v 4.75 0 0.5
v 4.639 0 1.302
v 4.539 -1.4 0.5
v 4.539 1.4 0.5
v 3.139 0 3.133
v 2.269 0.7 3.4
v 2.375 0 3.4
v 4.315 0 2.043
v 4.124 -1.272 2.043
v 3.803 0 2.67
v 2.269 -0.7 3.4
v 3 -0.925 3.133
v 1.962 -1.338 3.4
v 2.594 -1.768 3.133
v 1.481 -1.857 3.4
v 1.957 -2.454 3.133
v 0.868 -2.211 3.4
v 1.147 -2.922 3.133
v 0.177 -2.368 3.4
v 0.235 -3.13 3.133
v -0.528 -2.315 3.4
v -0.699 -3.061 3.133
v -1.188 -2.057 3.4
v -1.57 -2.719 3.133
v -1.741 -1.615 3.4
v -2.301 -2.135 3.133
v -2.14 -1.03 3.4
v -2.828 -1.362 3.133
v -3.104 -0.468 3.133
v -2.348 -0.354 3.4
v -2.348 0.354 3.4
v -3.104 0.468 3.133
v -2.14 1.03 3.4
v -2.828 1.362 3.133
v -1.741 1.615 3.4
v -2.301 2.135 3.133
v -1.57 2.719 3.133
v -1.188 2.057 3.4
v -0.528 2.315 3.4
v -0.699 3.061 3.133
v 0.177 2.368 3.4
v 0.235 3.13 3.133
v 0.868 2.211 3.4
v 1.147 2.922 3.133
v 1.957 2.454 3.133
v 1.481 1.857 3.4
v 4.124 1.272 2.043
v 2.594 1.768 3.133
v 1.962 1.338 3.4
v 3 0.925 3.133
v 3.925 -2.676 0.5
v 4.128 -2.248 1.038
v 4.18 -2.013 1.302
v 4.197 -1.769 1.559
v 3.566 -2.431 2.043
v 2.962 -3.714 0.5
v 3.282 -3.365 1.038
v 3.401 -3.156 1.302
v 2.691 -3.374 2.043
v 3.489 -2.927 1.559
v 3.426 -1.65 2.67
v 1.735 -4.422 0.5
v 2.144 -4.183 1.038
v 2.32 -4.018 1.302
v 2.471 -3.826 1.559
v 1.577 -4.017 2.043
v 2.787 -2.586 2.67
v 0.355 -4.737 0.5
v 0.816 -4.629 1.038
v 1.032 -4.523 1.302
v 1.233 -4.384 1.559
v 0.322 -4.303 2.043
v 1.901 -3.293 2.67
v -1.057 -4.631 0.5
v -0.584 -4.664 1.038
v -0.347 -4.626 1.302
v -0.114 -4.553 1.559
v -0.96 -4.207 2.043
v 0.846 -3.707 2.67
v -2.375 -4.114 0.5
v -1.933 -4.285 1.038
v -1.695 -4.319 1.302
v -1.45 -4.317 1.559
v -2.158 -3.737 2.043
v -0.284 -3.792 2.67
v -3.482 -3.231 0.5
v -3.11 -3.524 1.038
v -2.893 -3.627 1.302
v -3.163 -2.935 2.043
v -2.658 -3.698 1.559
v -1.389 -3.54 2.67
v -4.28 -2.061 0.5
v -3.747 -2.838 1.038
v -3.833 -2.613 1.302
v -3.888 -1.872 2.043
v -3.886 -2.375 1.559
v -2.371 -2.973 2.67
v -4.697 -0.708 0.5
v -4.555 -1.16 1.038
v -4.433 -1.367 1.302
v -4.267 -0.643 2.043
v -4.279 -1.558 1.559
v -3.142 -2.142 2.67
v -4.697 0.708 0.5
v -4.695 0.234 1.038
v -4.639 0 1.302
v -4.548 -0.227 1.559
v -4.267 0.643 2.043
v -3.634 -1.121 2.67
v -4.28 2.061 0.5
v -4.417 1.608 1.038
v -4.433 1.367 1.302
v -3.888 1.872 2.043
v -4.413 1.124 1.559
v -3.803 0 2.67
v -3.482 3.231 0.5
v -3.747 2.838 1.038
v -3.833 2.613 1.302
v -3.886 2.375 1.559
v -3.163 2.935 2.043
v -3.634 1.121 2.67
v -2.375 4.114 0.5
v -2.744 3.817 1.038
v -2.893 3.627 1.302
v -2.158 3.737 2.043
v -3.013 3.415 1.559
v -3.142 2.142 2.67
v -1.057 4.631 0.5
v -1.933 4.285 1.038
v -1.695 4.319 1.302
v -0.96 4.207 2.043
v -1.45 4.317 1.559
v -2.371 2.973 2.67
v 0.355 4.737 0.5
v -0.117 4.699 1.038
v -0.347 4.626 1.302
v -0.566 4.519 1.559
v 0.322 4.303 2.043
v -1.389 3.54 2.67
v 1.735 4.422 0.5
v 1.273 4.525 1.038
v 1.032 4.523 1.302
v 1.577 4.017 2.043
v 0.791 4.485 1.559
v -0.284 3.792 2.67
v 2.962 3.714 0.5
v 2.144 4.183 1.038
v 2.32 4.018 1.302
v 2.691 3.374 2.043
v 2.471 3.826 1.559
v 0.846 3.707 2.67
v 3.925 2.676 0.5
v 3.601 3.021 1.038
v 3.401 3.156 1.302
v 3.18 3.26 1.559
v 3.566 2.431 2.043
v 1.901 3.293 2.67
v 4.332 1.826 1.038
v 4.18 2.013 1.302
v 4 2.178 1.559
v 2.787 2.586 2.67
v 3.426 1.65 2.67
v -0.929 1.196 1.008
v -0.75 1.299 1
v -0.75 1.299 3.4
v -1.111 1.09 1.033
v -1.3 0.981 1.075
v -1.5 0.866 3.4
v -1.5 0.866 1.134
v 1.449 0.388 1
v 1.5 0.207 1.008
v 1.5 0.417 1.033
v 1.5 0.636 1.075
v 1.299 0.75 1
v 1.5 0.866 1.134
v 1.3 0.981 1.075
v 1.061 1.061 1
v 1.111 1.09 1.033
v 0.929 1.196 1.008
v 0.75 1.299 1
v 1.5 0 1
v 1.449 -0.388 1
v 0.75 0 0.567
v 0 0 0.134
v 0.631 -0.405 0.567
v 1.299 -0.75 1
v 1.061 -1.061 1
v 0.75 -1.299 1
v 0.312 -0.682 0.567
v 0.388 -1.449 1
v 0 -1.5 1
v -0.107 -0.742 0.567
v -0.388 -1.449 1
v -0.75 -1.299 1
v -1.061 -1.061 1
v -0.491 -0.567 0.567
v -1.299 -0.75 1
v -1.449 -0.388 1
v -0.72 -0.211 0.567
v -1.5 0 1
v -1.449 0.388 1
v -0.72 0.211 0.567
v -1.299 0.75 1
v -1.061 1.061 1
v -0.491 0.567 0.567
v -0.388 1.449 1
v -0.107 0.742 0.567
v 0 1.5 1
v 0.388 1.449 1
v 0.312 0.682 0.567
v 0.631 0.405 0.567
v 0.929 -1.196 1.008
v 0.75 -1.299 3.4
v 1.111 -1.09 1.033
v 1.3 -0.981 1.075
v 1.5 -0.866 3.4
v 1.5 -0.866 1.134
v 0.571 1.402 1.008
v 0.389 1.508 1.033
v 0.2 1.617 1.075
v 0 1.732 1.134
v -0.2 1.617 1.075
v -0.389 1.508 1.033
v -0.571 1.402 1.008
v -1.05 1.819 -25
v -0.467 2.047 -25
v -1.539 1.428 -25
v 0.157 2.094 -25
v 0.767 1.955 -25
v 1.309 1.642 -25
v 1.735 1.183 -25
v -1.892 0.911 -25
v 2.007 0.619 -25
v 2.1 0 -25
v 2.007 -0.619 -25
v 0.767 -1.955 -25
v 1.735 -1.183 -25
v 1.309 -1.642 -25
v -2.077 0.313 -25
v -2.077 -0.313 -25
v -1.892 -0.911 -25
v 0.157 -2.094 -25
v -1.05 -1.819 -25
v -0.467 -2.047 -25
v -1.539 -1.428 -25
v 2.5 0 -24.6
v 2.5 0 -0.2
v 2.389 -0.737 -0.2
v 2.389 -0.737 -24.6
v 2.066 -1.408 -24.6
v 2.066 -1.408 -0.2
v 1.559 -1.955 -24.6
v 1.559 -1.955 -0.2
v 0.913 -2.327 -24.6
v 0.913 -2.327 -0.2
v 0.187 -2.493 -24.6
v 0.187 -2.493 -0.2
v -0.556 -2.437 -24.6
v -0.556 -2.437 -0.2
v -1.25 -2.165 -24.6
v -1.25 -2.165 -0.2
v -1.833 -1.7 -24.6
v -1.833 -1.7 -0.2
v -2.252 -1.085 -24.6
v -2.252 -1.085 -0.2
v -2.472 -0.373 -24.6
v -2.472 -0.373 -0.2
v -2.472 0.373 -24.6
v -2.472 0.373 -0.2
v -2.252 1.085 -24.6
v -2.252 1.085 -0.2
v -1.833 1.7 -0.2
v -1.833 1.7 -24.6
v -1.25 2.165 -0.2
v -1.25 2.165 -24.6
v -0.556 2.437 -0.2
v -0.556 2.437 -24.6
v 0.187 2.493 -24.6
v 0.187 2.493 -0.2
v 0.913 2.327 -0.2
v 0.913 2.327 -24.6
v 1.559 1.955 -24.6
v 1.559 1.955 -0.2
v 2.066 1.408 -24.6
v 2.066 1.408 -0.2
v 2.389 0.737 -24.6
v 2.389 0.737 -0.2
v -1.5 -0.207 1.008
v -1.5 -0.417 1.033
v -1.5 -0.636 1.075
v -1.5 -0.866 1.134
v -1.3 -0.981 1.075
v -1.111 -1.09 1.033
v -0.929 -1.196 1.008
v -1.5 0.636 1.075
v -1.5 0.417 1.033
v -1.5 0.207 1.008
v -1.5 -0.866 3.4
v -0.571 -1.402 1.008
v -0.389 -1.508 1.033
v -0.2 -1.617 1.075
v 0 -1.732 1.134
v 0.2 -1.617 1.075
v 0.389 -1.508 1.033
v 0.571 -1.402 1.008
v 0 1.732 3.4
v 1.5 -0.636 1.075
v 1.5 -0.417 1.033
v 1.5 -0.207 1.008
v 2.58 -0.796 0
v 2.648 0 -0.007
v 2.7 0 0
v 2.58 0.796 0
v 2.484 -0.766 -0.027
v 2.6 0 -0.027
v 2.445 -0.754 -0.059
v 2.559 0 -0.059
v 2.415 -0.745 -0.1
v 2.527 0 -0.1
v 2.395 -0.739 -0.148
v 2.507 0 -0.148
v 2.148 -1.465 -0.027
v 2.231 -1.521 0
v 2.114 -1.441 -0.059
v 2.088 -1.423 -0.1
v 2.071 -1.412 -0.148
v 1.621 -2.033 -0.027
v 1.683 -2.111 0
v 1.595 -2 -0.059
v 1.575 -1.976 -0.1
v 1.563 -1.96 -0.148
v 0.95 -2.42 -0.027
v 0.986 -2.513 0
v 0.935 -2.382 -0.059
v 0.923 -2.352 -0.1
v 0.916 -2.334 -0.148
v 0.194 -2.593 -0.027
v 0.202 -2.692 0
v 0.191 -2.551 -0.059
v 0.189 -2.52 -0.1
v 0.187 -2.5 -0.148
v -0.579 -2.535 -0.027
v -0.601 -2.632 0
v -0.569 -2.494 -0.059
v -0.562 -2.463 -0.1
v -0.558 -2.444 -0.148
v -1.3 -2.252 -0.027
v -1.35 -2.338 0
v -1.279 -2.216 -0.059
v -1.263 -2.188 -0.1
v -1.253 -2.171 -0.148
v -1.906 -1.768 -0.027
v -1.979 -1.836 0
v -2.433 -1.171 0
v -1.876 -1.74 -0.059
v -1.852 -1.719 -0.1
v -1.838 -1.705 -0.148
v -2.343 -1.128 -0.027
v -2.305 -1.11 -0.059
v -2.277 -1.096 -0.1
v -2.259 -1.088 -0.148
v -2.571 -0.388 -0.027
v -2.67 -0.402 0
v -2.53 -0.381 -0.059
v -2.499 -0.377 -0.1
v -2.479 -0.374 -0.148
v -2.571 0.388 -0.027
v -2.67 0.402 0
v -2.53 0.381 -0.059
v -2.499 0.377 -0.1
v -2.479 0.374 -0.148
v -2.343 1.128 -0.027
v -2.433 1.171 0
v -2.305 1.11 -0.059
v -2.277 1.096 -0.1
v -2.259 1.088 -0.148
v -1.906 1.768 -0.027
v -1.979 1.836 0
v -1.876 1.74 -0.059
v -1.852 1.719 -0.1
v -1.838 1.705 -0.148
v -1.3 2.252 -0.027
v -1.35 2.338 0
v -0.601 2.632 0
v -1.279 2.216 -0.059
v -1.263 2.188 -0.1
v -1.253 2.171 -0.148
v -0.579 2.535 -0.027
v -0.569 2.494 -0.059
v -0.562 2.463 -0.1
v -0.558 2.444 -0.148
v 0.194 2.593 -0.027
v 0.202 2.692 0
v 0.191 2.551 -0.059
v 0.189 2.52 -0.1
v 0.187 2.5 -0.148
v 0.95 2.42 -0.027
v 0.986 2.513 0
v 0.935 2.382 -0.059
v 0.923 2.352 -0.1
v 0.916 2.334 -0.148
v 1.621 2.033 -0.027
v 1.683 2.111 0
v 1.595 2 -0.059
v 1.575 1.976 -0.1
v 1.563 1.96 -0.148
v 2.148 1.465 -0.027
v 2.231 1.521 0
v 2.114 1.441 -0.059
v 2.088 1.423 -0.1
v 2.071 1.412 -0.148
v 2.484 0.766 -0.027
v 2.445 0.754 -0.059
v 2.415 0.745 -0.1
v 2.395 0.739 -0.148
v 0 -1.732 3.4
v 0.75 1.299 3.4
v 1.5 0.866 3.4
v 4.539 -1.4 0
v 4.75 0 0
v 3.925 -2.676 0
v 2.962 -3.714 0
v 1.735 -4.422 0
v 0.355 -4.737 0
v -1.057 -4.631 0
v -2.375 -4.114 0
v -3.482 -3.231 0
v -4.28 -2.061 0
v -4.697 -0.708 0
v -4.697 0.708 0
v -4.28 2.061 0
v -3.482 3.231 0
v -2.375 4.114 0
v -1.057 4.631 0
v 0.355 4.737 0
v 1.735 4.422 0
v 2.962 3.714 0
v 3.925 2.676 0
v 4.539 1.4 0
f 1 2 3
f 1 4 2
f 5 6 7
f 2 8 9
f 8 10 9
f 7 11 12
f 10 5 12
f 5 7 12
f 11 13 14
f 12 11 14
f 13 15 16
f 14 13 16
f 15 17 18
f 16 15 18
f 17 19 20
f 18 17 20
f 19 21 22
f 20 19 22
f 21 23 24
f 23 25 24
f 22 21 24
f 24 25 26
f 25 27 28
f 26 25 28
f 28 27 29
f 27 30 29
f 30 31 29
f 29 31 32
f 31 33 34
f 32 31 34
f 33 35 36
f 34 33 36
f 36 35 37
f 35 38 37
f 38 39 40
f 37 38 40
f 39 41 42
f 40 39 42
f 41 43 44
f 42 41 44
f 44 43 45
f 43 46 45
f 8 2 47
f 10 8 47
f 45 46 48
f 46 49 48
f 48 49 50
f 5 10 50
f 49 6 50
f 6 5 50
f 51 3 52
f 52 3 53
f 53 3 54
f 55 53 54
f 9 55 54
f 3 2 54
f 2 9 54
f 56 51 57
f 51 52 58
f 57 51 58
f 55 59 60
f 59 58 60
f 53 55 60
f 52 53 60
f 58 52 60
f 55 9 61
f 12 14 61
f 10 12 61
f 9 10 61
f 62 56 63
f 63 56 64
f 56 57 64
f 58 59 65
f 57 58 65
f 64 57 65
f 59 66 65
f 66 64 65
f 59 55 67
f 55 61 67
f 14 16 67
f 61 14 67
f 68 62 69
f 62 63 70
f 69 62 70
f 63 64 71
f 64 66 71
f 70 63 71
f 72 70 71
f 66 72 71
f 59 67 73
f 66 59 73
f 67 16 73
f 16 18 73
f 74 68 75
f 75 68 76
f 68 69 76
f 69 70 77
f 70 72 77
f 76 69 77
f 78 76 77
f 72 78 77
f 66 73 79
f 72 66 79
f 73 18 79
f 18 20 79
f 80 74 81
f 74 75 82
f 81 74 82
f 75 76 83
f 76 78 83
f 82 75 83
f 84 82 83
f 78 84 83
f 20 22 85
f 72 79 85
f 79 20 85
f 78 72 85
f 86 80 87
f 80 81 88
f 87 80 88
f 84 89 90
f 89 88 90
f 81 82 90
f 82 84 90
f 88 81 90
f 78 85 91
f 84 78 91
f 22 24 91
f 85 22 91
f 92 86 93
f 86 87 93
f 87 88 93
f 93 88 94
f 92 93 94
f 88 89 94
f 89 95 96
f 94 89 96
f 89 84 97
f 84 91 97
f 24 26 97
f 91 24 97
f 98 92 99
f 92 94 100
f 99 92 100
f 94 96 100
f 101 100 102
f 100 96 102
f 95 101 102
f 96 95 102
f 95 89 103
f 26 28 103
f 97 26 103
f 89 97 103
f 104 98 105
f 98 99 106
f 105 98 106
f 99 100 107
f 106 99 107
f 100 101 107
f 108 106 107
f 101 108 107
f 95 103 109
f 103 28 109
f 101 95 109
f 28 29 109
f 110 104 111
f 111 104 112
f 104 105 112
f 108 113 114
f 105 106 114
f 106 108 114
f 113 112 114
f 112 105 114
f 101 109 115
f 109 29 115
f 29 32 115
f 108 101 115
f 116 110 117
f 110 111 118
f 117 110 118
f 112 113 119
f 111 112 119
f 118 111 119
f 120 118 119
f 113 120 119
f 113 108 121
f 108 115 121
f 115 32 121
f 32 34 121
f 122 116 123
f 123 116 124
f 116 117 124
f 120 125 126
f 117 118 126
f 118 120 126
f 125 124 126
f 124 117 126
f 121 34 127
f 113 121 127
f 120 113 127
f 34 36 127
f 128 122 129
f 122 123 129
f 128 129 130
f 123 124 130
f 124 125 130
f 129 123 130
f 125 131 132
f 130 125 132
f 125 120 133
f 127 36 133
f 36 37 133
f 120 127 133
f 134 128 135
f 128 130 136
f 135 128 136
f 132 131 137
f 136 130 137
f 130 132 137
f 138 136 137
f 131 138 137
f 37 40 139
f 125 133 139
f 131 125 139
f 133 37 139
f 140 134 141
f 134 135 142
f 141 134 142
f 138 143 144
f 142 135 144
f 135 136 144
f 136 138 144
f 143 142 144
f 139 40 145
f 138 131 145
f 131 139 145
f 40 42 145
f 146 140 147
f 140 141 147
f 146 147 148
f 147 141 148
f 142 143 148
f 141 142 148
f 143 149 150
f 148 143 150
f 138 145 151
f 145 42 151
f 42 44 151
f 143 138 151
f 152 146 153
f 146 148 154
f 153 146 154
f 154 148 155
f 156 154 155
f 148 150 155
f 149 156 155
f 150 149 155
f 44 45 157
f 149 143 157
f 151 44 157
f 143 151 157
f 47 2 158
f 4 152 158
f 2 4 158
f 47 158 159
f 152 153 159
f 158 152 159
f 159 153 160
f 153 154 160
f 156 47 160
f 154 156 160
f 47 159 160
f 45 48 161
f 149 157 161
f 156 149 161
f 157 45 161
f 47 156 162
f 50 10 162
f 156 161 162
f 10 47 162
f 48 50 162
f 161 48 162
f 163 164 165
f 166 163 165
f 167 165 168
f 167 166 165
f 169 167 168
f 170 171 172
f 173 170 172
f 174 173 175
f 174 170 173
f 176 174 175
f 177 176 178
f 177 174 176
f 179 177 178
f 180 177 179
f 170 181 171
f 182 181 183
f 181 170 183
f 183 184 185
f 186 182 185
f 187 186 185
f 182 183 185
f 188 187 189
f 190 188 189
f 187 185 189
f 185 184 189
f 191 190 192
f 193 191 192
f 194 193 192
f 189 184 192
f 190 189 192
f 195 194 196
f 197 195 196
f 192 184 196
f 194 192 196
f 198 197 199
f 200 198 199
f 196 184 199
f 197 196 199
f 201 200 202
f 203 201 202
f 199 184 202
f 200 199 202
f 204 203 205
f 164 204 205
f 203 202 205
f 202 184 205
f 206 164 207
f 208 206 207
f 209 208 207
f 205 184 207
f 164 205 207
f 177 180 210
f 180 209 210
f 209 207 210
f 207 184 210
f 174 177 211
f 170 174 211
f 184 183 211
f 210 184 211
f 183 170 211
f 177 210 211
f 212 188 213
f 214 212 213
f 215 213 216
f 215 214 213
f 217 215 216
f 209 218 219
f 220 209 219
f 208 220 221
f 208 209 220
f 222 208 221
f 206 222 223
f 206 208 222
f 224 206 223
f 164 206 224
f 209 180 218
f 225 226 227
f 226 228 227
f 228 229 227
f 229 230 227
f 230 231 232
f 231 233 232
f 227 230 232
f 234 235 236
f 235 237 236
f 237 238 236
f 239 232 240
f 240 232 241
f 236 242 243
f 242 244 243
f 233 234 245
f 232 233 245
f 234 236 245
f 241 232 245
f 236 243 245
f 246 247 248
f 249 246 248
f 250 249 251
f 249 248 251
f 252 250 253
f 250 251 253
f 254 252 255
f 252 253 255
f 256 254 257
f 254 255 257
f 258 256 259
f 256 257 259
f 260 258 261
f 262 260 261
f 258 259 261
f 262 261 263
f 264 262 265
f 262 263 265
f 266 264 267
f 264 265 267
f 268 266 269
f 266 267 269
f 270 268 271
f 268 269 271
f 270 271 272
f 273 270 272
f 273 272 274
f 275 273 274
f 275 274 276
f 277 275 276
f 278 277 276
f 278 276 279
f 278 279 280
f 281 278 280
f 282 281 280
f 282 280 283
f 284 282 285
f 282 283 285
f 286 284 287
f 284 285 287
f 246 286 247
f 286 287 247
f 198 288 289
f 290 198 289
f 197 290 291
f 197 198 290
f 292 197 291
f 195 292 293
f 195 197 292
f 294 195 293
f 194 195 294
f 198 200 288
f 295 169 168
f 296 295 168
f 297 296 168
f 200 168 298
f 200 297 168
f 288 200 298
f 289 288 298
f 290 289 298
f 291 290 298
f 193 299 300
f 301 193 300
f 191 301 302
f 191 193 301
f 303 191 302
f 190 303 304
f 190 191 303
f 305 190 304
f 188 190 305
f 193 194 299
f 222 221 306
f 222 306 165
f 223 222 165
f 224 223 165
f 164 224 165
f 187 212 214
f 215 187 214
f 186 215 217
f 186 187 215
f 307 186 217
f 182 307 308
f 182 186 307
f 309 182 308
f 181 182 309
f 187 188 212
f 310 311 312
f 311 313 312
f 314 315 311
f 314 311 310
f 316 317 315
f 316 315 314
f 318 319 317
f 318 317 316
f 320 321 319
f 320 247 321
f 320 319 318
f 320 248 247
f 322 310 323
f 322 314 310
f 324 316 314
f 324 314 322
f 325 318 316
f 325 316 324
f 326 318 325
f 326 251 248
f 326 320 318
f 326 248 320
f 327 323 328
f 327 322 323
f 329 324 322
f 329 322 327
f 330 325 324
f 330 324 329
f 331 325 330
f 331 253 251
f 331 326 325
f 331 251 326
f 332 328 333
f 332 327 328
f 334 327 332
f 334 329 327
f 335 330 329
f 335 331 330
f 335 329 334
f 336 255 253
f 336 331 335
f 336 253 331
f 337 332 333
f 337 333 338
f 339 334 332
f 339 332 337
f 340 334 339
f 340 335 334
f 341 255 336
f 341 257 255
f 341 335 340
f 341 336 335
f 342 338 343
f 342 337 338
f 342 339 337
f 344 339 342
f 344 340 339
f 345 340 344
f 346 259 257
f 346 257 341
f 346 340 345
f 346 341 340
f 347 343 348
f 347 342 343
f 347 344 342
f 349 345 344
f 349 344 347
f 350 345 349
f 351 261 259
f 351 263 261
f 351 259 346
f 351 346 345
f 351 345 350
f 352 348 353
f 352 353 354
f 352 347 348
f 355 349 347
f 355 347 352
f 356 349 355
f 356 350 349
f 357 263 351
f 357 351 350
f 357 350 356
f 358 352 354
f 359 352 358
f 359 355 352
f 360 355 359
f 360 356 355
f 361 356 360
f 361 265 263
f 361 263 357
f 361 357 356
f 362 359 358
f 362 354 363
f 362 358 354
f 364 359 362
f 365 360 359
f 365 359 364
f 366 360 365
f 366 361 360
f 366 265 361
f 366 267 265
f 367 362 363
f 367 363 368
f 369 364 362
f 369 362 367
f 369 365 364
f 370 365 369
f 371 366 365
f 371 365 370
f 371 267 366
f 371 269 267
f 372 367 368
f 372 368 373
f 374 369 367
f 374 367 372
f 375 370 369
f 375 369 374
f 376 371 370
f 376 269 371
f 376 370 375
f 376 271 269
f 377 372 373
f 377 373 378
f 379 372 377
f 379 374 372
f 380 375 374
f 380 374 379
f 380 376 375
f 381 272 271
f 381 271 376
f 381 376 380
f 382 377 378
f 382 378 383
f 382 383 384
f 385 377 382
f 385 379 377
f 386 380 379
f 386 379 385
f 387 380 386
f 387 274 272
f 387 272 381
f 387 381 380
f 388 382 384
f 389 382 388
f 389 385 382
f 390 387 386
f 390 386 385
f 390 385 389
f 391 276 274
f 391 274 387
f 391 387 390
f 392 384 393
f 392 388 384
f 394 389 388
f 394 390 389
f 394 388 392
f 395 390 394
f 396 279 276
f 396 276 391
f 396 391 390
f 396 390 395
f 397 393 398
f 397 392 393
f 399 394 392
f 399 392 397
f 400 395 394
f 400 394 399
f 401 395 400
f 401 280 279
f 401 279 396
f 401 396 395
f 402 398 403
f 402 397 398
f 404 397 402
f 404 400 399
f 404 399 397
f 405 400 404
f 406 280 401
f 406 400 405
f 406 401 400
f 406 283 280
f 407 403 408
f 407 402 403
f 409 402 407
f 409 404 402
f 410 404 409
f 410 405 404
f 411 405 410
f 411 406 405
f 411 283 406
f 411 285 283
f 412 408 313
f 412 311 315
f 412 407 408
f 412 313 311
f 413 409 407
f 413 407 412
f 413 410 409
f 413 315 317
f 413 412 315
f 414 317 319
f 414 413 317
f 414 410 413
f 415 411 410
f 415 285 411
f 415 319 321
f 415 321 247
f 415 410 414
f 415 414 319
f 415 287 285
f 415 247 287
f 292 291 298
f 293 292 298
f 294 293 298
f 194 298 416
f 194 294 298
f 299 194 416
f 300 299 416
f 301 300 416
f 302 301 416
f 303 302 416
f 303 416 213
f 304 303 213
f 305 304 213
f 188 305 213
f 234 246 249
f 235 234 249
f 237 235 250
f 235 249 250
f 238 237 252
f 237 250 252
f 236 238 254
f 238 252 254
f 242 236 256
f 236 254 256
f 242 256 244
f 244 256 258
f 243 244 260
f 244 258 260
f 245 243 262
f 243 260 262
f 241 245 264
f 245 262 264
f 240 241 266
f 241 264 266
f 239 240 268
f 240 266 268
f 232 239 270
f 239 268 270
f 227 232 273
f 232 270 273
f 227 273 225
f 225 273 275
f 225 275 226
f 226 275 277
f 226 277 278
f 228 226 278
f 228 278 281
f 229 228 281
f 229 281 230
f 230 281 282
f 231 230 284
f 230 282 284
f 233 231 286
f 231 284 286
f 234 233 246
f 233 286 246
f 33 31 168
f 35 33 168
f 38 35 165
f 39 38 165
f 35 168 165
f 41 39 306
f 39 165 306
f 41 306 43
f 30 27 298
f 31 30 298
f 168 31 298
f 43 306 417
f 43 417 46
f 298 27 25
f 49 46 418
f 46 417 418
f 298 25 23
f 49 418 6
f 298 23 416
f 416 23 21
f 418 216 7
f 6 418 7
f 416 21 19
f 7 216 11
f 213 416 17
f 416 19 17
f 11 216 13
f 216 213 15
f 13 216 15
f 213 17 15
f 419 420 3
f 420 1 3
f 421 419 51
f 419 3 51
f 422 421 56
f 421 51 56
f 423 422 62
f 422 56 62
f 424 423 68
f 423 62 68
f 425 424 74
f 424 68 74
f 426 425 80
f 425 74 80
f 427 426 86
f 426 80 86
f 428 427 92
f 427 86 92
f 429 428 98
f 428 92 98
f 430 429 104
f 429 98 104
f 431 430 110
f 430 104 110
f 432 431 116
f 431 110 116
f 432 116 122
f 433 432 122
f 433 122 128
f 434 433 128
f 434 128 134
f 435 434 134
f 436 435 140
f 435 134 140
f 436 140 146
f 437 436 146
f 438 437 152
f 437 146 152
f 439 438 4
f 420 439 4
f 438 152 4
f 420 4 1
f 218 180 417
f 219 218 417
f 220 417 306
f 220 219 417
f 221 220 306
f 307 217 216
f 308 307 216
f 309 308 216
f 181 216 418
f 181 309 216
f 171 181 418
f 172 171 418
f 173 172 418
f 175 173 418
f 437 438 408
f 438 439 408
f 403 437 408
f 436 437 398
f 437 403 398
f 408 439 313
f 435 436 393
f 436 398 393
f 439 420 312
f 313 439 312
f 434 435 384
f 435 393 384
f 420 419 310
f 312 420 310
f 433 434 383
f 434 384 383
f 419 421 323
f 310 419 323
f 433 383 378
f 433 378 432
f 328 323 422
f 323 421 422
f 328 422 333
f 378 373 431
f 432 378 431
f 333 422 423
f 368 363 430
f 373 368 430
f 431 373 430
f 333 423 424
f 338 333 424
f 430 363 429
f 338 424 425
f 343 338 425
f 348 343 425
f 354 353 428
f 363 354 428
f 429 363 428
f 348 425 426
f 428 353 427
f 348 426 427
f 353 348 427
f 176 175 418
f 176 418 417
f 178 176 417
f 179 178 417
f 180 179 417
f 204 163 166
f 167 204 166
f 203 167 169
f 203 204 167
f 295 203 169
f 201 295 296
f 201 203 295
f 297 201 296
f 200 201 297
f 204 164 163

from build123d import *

# Parameters (mm, degrees)
CHAMFER1_SIZE      = 0.4
CUT_EXTRUDE1_START = -2.4000001
CUT_EXTRUDE1_DEPTH = 3.4000001
FILLET1_R          = 0.2


with BuildPart() as part:
    # Sketch1 → Revolve1 (revolve)
    with BuildSketch(Plane(origin=(0, 0, 0), x_dir=(0, 0, -1), z_dir=(1, 0, 0)), mode=Mode.PRIVATE) as revolve1_sk:
        with BuildLine():
            Line((25, 0), (25, 2.5))
            Line((25, 2.5), (0, 2.5))
            Line((0, 2.5), (0, 4.75))
            Line((0, 4.75), (-0.5, 4.75))
            ThreePointArc((-0.5, 4.75), (-2.374208166, 4.080480498), (-3.4, 2.375))
            Line((-3.4, 2.375), (-3.4, 0))
            Line((-3.4, 0), (25, 0))
        make_face()
    revolve(revolve1_sk.sketch.rotate(Axis((0, 0, 30.809969789), (0, 0, -1)), 90), axis=Axis((0, 0, 30.809969789), (0, 0, -1)))

    # Chamfer1
    chamfer1_edges = [part.edges().sort_by_distance(p)[0] for p in [
        (-2.5, 0, -25),
    ]]
    chamfer(chamfer1_edges, length=CHAMFER1_SIZE)

    # Sketch2 → Cut-Revolve1 (revolve, cut)
    with BuildSketch(Plane(origin=(0, 0, 0), x_dir=(0, 0, -1), z_dir=(1, 0, 0)), mode=Mode.PRIVATE) as cut_revolve1_sk:
        Polygon((-3.4, 0), (-3.4, 1.5), (-1, 1.5), (-0.133974596, 0), align=None)
    revolve(cut_revolve1_sk.sketch.rotate(Axis((0, 0, 2.452500839), (0, 0, -1)), 90), axis=Axis((0, 0, 2.452500839), (0, 0, -1)), mode=Mode.SUBTRACT)

    # Cut-Extrude1: read off the stored shape, not the designer's step
    # Cut-Extrude1 outline → Cut-Extrude1 (cut)
    with BuildSketch(Plane.XY.offset(3.4).offset(CUT_EXTRUDE1_START)):
        with BuildLine():
            Line((1.5, 0), (1.5, 0.866025404))
            Line((1.5, 0.866025404), (0.750000011, 1.299038099))
            ThreePointArc((0.750000011, 1.299038099), (1.299038109, 0.749999994), (1.5, 0))
        make_face()
        with BuildLine():
            ThreePointArc((-0.749999993, 1.29903811), (1e-08, 1.5), (0.750000011, 1.299038099))
            Line((0.750000011, 1.299038099), (0, 1.732050808))
            Line((0, 1.732050808), (-0.749999993, 1.29903811))
        make_face()
        with BuildLine():
            Line((1.5, -0.866025404), (1.5, 0))
            ThreePointArc((1.5, 0), (1.299038107, -0.749999997), (0.750000005, -1.299038103))
            Line((0.750000005, -1.299038103), (1.5, -0.866025404))
        make_face()
        with BuildLine():
            ThreePointArc((-1.5, 0), (-1.299038104, 0.750000003), (-0.749999993, 1.29903811))
            Line((-0.749999993, 1.29903811), (-1.5, 0.866025404))
            Line((-1.5, 0.866025404), (-1.5, 0))
        make_face()
        with BuildLine():
            Line((0, -1.732050808), (0.750000005, -1.299038103))
            ThreePointArc((0.750000005, -1.299038103), (3e-09, -1.5), (-0.75, -1.299038106))
            Line((-0.75, -1.299038106), (0, -1.732050808))
        make_face()
        with BuildLine():
            ThreePointArc((-0.75, -1.299038106), (-1.299038106, -0.75), (-1.5, 0))
            Line((-1.5, 0), (-1.5, -0.866025404))
            Line((-1.5, -0.866025404), (-0.75, -1.299038106))
        make_face()
    extrude(amount=CUT_EXTRUDE1_DEPTH, mode=Mode.SUBTRACT)

    # Cut-Extrude1 2 outline → Cut-Extrude1 2 (revolve)
    with BuildSketch(Plane.XZ):
        Polygon((1.732050837, 1.133974613), (1.499999957, 0.999999975), (1.732050808, 0.9999999), align=None)
    revolve(axis=Axis((0, 0, 0), (0, 0, 1)))

    # Fillet1
    fillet1_edges = [part.edges().sort_by_distance(p)[0] for p in [
        (-2.5, 0, 0),
    ]]
    fillet(fillet1_edges, radius=FILLET1_R)


solid = part.part
